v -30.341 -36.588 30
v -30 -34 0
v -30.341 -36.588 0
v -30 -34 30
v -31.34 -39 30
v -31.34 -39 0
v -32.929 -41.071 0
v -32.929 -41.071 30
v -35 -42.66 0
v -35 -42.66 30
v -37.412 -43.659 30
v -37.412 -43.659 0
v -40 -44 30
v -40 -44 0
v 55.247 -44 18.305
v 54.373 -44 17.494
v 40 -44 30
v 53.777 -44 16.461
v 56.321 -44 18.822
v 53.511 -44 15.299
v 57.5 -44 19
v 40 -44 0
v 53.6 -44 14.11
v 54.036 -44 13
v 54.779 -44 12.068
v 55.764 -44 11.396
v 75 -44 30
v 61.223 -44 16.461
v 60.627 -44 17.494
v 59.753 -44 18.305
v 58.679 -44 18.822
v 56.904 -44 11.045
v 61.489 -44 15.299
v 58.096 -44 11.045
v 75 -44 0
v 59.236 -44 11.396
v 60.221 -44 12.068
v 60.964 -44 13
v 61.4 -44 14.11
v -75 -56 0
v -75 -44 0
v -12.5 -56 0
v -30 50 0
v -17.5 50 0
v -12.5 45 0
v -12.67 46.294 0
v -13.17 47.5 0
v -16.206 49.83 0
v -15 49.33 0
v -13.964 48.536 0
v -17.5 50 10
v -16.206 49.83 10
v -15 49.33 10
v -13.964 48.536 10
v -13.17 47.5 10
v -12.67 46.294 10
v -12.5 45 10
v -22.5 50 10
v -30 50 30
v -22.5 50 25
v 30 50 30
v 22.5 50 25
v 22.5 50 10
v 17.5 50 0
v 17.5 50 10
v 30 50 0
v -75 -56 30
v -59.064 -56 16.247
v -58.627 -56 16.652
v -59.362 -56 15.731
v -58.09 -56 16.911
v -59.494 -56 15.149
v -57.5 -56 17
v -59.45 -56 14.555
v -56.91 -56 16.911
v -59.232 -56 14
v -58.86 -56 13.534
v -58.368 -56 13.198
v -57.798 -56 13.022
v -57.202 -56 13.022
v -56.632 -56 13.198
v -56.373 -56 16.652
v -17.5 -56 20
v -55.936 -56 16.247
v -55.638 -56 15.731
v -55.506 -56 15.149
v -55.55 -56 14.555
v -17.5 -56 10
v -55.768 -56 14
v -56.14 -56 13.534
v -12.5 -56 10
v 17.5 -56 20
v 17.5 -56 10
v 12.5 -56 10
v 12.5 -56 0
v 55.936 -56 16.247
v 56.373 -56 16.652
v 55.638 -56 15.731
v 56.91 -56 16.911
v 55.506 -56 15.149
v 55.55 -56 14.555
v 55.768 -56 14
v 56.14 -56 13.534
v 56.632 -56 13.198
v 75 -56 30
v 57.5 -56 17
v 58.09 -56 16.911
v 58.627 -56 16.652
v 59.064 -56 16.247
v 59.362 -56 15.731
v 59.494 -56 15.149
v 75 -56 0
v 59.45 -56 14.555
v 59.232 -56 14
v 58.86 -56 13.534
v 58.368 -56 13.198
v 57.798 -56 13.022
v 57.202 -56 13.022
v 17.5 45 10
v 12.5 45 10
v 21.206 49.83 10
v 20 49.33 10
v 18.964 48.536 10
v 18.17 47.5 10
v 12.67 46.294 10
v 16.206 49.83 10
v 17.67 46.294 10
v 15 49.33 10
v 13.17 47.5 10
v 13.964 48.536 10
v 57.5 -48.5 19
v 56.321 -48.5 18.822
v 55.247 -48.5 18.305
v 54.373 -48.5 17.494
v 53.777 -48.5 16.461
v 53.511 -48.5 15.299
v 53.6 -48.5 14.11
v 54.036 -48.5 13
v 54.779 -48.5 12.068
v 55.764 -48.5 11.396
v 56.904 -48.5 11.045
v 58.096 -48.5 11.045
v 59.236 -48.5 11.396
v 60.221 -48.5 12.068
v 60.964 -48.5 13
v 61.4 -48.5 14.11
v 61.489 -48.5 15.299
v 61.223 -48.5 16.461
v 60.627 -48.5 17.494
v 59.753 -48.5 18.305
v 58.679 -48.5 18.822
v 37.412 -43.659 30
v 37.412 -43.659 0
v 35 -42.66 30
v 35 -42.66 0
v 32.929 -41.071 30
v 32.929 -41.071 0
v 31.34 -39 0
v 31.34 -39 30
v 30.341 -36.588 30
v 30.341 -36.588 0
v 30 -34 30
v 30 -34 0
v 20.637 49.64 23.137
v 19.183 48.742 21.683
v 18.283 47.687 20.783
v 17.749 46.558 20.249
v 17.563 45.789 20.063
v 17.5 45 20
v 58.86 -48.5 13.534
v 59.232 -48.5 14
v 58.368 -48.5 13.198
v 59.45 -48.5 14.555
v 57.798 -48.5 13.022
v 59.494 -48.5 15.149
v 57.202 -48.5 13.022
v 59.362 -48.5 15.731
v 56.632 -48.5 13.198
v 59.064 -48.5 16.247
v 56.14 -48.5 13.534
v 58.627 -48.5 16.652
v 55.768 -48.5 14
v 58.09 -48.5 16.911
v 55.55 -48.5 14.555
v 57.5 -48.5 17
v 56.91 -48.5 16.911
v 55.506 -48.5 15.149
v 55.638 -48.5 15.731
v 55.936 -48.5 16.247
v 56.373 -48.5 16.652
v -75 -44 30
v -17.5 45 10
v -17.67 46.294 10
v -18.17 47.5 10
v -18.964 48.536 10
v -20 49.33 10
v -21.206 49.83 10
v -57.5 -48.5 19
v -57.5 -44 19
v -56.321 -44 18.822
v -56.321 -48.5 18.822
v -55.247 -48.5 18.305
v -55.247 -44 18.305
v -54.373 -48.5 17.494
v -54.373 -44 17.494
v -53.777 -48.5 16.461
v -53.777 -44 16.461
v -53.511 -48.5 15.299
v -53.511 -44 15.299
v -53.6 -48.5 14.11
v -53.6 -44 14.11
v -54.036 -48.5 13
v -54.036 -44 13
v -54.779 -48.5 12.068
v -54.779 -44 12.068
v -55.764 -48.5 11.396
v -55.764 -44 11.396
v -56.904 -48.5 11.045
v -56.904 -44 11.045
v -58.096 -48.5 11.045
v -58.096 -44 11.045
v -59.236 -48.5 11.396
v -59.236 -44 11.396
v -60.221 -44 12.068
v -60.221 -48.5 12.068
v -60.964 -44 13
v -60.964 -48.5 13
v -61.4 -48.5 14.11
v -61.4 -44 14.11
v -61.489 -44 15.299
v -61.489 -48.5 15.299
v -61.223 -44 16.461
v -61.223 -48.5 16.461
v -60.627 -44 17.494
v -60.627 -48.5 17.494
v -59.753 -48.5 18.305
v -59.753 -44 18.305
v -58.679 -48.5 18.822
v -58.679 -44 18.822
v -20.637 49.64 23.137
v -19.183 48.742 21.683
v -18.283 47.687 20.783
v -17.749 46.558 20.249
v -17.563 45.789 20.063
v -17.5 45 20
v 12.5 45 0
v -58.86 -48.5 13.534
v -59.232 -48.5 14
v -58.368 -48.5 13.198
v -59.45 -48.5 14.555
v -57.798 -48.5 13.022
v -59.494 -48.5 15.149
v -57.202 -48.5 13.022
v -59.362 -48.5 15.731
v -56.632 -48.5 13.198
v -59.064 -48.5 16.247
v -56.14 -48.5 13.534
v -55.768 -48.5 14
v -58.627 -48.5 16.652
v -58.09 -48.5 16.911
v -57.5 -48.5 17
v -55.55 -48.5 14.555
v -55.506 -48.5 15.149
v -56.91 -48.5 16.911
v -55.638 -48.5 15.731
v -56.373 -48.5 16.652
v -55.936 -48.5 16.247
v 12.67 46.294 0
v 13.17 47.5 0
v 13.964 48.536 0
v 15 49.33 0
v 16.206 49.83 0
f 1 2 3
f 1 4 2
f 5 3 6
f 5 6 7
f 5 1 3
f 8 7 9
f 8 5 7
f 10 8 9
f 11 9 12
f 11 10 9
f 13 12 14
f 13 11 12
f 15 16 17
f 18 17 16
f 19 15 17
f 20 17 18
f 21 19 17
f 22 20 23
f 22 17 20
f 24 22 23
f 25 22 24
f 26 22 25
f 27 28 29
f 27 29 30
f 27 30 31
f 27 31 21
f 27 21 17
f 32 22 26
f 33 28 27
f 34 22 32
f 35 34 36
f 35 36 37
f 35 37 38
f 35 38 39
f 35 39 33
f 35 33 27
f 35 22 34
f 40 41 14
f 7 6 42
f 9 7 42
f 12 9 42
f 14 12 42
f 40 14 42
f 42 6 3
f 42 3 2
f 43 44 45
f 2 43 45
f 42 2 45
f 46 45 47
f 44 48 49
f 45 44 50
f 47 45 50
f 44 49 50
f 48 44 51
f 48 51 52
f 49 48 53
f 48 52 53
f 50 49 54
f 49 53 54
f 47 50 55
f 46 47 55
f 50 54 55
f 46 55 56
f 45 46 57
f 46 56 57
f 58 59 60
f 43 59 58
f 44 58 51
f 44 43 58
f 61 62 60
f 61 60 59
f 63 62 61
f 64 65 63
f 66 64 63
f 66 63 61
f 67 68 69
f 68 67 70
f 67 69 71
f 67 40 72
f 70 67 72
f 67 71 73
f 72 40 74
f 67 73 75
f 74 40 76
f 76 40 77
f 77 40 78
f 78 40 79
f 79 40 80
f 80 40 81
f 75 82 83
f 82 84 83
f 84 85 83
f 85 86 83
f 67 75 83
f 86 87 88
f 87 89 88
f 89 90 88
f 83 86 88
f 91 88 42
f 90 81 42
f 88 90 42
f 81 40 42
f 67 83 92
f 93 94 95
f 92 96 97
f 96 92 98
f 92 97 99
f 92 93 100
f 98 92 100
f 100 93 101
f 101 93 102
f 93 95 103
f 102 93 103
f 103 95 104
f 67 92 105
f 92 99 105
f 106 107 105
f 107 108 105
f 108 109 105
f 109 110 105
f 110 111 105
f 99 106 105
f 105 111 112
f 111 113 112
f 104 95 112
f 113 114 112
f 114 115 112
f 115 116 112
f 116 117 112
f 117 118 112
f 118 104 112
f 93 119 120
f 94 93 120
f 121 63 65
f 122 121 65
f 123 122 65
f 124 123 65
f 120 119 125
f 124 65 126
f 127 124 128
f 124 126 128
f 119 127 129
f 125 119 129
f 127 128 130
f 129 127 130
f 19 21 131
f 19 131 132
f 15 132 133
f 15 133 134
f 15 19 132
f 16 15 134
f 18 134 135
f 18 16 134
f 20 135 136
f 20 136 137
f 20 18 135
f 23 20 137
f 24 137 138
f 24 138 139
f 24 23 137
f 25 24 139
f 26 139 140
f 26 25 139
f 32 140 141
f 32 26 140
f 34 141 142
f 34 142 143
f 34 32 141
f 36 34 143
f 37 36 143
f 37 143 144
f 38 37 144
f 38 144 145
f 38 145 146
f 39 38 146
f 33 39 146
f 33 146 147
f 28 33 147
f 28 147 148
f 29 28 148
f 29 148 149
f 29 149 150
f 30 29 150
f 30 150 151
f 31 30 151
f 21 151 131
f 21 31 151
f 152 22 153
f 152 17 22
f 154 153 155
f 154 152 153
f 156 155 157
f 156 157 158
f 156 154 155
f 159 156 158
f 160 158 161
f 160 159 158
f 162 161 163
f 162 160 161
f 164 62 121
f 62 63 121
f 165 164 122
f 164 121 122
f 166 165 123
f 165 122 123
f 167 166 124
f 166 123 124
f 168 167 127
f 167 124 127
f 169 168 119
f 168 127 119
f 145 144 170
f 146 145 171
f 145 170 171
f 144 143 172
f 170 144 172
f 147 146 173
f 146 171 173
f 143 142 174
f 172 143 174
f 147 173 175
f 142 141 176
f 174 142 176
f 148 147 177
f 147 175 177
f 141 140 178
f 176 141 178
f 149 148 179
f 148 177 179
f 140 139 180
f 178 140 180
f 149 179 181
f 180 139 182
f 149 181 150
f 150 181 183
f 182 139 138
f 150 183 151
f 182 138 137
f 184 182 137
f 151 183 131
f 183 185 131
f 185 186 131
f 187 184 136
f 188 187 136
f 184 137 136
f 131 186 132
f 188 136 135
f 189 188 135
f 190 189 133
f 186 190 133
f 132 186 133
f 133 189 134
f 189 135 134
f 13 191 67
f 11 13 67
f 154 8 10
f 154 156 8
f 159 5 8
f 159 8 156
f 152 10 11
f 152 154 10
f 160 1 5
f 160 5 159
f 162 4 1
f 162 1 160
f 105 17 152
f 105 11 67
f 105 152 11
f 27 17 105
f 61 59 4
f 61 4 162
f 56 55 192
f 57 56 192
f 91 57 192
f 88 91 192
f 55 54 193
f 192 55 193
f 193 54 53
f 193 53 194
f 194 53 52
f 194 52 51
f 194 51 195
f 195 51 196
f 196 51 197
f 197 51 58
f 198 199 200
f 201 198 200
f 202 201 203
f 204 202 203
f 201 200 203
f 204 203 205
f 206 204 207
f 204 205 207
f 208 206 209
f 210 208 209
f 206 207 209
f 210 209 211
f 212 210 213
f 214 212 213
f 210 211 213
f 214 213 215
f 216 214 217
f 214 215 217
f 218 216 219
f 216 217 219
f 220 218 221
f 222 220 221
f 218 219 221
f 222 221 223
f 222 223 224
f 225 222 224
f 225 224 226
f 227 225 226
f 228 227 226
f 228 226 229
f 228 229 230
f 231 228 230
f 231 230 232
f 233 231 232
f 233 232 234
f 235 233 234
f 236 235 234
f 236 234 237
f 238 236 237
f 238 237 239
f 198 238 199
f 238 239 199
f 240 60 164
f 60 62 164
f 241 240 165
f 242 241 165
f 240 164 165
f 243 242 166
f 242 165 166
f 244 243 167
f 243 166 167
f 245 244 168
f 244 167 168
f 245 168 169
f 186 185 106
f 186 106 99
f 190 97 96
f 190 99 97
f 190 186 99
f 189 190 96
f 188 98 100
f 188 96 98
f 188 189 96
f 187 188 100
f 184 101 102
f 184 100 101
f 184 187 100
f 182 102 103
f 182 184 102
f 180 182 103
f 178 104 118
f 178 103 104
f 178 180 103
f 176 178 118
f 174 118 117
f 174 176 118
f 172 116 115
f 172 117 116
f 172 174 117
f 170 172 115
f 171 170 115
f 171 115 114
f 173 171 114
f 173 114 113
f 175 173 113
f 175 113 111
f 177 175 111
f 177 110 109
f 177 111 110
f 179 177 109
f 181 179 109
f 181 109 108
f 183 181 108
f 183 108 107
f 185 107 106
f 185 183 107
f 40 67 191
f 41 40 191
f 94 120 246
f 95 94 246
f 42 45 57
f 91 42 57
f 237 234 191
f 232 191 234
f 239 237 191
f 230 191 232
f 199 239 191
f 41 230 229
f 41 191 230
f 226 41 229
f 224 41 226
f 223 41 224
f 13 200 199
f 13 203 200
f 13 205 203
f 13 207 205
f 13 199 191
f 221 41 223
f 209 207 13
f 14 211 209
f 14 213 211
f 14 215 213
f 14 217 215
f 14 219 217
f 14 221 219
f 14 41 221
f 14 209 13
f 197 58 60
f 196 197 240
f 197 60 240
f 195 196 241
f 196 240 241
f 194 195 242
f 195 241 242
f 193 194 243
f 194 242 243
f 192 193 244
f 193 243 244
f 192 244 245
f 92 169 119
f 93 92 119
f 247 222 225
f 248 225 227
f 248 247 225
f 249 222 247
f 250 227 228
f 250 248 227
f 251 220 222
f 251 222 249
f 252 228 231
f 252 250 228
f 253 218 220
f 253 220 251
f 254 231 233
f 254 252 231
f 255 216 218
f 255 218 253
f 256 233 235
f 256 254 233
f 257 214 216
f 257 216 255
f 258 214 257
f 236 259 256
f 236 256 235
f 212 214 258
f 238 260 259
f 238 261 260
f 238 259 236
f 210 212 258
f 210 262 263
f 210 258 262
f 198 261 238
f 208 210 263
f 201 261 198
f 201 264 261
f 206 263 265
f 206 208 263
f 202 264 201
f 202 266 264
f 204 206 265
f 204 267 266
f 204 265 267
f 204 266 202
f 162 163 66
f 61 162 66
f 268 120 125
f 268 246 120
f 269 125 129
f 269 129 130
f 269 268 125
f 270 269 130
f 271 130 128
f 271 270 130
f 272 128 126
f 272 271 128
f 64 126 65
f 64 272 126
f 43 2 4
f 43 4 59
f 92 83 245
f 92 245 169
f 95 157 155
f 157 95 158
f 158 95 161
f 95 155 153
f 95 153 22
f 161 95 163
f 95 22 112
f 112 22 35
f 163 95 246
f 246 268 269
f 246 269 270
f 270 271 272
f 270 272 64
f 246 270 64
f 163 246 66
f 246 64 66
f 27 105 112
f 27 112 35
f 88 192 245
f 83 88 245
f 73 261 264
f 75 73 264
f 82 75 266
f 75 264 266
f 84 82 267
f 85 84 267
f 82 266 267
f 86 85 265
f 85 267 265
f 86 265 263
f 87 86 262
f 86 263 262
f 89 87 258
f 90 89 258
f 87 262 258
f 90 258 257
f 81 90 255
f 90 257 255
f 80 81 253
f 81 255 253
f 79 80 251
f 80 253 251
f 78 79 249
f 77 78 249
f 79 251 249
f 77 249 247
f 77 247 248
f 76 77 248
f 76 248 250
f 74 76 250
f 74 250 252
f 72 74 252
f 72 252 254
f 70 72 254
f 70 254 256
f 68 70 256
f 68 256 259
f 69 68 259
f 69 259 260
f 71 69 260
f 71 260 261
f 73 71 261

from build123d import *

# Parameters (mm, degrees)
SKETCH1_W           = 60
SKETCH1_H           = 100
SKETCH1_W_2         = 150
SKETCH1_H_2         = 12
BOSS_EXTRUDE1_DEPTH = 30
FILLET1_R           = 10
SKETCH2_W           = 25
SKETCH2_H           = 10
SKETCH2_H_2         = 5
CUT_EXTRUDE1_DEPTH  = 222
FILLET2_R           = 5
SKETCH3_R           = 2
CUT_EXTRUDE2_DEPTH  = 51
SKETCH4_R           = 4
CUT_EXTRUDE3_DEPTH  = 4.5


with BuildPart() as part:
    # Sketch1 → Boss-Extrude1 (new body)
    with BuildSketch(Plane.XY):
        Rectangle(SKETCH1_W, SKETCH1_H)
        with Locations((0, -50)):
            Rectangle(SKETCH1_W_2, SKETCH1_H_2)
    extrude(amount=BOSS_EXTRUDE1_DEPTH)

    # Fillet1
    fillet1_edges = [part.edges().sort_by_distance(p)[0] for p in [
        (-30, -44, 15),
        (30, -44, 15),
    ]]
    fillet(fillet1_edges, radius=FILLET1_R)

    # Sketch2 → Cut-Extrude1 (cut)
    with BuildSketch(Plane(origin=(0, 50, 0), x_dir=(1, 0, 0), z_dir=(0, 1, 0))):
        with Locations((0, -5)):
            Rectangle(SKETCH2_W, SKETCH2_H)
        with Locations((0, -12.5)):
            Rectangle(SKETCH2_W, SKETCH2_H_2)
        Polygon((17.5, -10), (12.5, -10), (12.5, -15), (-12.5, -15), (-12.5, -10), (-17.5, -10), (-17.5, -20), (17.5, -20), align=None)
    extrude(amount=-CUT_EXTRUDE1_DEPTH, mode=Mode.SUBTRACT)

    # Fillet2
    fillet2_edges = [part.edges().sort_by_distance(p)[0] for p in [
        (12.5, 50, 5),
        (-12.5, 50, 5),
        (0, 50, 20),
        (-17.5, 50, 15),
        (17.5, 50, 15),
    ]]
    fillet(fillet2_edges, radius=FILLET2_R)

    # Sketch3 → Cut-Extrude2 (cut)
    with BuildSketch(Plane(origin=(0, -44, 0), x_dir=(1, 0, 0), z_dir=(0, 1, 0))):
        with Locations(Location((-57.5, -15, 0), (0, 0, 270))):
            Circle(SKETCH3_R)
    cut_extrude2 = extrude(amount=-CUT_EXTRUDE2_DEPTH, mode=Mode.SUBTRACT)

    # Sketch4 → Cut-Extrude3 (cut)
    with BuildSketch(Plane(origin=(0, -44, 0), x_dir=(1, 0, 0), z_dir=(0, 1, 0))):
        with Locations(Location((-57.5, -15, 0), (0, 0, 270))):
            Circle(SKETCH4_R)
    cut_extrude3 = extrude(amount=-CUT_EXTRUDE3_DEPTH, mode=Mode.SUBTRACT)

    # Mirror1: Cut-Extrude2, Cut-Extrude3 across plane
    add(cut_extrude2.mirror(Plane(origin=(0, 0, 0), x_dir=(0, 0, 1), z_dir=(1, 0, 0))), mode=Mode.SUBTRACT)
    add(cut_extrude3.mirror(Plane(origin=(0, 0, 0), x_dir=(0, 0, 1), z_dir=(1, 0, 0))), mode=Mode.SUBTRACT)


solid = part.part
